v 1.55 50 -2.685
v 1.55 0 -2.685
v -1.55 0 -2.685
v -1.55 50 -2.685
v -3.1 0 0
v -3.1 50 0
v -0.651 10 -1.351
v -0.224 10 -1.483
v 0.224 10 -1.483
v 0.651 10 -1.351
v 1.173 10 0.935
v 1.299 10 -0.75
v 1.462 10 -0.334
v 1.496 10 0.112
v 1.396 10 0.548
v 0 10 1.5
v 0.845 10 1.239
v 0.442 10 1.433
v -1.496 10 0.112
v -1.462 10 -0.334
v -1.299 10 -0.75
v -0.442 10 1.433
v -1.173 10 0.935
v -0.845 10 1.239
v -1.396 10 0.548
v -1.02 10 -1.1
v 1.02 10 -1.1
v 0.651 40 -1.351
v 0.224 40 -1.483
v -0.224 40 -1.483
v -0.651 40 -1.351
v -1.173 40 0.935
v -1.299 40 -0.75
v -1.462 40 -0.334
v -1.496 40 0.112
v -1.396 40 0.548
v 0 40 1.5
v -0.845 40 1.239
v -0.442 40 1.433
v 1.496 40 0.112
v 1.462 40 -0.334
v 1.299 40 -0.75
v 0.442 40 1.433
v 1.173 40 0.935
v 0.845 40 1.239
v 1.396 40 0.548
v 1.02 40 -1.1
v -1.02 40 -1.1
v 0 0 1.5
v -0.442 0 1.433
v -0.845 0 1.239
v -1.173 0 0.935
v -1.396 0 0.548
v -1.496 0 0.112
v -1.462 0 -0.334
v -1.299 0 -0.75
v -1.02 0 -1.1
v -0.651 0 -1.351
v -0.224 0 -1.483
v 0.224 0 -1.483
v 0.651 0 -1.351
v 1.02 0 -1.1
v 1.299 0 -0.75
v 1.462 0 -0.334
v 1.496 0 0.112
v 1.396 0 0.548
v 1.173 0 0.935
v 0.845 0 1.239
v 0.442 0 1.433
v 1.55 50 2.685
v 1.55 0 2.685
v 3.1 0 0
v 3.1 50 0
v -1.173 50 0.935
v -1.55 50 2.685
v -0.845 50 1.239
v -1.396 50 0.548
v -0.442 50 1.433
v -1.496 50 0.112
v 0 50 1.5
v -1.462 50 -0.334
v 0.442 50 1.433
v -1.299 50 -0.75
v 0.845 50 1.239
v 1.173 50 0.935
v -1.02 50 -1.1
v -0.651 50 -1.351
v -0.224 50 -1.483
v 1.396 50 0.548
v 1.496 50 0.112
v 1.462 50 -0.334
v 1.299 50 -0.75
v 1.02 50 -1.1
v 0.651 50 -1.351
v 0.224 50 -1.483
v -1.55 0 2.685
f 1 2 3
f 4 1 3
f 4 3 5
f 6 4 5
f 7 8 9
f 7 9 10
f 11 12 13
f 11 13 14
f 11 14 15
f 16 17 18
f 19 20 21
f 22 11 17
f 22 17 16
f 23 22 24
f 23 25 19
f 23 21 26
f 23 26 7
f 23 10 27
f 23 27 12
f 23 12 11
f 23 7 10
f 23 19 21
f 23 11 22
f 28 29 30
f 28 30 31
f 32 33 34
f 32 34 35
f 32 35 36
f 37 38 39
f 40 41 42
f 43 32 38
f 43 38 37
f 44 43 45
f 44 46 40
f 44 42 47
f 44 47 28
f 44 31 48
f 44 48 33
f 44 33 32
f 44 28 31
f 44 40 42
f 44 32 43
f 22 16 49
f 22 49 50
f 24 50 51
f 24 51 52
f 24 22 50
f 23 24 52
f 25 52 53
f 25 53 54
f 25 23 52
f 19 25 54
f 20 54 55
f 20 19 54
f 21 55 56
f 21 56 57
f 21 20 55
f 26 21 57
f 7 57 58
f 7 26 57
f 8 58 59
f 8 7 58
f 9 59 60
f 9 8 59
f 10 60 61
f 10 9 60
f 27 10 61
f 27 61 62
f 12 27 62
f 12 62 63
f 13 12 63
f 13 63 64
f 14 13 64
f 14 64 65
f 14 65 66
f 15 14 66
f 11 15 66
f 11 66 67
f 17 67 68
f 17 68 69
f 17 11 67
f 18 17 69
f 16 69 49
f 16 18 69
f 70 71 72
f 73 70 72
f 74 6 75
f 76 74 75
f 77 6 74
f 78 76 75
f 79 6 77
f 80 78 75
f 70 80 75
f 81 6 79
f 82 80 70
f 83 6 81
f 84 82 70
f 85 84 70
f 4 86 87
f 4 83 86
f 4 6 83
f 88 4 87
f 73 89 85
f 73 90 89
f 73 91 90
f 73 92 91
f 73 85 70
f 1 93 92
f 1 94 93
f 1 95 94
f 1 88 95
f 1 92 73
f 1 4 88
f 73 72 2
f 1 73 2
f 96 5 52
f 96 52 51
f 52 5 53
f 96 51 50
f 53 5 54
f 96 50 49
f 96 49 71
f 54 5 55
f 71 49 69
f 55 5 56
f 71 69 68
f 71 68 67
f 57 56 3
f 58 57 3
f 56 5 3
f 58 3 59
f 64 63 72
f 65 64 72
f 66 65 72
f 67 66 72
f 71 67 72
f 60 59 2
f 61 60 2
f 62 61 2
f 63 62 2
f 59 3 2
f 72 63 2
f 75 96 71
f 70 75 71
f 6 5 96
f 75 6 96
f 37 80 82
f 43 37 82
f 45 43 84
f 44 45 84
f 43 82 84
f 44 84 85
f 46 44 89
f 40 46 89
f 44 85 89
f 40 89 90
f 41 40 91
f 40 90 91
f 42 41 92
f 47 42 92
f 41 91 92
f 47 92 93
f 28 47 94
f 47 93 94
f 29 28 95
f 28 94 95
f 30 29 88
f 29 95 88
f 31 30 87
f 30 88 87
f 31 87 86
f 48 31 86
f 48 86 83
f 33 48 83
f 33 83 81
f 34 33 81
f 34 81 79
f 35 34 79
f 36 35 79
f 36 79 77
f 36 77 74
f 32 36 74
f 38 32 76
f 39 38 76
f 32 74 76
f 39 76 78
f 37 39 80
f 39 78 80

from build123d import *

# Parameters (mm, degrees)
SALIENTE_EXTRUIR1_DEPTH = 50
CROQUIS2_R              = 1.5
CORTAR_EXTRUIR1_DEPTH   = 10
CORTAR_EXTRUIR2_START   = -10
CROQUIS3_R              = 1.5
CORTAR_EXTRUIR2_DEPTH   = 10


with BuildPart() as part:
    # Croquis1 → Saliente-Extruir1 (new body)
    with BuildSketch(Plane(origin=(0, 0, 0), x_dir=(1, 0, 0), z_dir=(0, 1, 0))):
        Polygon((3.1, 0), (1.55, 2.684678752), (-1.55, 2.684678752), (-3.1, 0), (-1.55, -2.684678752), (1.55, -2.684678752), align=None)
    extrude(amount=SALIENTE_EXTRUIR1_DEPTH)

    # Croquis2 → Cortar-Extruir1 (cut)
    with BuildSketch(Plane(origin=(0, 50, 0), x_dir=(1, 0, 0), z_dir=(0, 1, 0))):
        with Locations(Location((0, 0, 0), (0, 0, 270))):
            Circle(CROQUIS2_R)
    extrude(amount=-CORTAR_EXTRUIR1_DEPTH, mode=Mode.SUBTRACT)

    # Croquis3 → Cortar-Extruir2 (cut)
    with BuildSketch(Plane.XZ.offset(CORTAR_EXTRUIR2_START)):
        with Locations(Location((0, 0, 0), (0, 0, 90))):
            Circle(CROQUIS3_R)
    extrude(amount=CORTAR_EXTRUIR2_DEPTH, mode=Mode.SUBTRACT)


solid = part.part
